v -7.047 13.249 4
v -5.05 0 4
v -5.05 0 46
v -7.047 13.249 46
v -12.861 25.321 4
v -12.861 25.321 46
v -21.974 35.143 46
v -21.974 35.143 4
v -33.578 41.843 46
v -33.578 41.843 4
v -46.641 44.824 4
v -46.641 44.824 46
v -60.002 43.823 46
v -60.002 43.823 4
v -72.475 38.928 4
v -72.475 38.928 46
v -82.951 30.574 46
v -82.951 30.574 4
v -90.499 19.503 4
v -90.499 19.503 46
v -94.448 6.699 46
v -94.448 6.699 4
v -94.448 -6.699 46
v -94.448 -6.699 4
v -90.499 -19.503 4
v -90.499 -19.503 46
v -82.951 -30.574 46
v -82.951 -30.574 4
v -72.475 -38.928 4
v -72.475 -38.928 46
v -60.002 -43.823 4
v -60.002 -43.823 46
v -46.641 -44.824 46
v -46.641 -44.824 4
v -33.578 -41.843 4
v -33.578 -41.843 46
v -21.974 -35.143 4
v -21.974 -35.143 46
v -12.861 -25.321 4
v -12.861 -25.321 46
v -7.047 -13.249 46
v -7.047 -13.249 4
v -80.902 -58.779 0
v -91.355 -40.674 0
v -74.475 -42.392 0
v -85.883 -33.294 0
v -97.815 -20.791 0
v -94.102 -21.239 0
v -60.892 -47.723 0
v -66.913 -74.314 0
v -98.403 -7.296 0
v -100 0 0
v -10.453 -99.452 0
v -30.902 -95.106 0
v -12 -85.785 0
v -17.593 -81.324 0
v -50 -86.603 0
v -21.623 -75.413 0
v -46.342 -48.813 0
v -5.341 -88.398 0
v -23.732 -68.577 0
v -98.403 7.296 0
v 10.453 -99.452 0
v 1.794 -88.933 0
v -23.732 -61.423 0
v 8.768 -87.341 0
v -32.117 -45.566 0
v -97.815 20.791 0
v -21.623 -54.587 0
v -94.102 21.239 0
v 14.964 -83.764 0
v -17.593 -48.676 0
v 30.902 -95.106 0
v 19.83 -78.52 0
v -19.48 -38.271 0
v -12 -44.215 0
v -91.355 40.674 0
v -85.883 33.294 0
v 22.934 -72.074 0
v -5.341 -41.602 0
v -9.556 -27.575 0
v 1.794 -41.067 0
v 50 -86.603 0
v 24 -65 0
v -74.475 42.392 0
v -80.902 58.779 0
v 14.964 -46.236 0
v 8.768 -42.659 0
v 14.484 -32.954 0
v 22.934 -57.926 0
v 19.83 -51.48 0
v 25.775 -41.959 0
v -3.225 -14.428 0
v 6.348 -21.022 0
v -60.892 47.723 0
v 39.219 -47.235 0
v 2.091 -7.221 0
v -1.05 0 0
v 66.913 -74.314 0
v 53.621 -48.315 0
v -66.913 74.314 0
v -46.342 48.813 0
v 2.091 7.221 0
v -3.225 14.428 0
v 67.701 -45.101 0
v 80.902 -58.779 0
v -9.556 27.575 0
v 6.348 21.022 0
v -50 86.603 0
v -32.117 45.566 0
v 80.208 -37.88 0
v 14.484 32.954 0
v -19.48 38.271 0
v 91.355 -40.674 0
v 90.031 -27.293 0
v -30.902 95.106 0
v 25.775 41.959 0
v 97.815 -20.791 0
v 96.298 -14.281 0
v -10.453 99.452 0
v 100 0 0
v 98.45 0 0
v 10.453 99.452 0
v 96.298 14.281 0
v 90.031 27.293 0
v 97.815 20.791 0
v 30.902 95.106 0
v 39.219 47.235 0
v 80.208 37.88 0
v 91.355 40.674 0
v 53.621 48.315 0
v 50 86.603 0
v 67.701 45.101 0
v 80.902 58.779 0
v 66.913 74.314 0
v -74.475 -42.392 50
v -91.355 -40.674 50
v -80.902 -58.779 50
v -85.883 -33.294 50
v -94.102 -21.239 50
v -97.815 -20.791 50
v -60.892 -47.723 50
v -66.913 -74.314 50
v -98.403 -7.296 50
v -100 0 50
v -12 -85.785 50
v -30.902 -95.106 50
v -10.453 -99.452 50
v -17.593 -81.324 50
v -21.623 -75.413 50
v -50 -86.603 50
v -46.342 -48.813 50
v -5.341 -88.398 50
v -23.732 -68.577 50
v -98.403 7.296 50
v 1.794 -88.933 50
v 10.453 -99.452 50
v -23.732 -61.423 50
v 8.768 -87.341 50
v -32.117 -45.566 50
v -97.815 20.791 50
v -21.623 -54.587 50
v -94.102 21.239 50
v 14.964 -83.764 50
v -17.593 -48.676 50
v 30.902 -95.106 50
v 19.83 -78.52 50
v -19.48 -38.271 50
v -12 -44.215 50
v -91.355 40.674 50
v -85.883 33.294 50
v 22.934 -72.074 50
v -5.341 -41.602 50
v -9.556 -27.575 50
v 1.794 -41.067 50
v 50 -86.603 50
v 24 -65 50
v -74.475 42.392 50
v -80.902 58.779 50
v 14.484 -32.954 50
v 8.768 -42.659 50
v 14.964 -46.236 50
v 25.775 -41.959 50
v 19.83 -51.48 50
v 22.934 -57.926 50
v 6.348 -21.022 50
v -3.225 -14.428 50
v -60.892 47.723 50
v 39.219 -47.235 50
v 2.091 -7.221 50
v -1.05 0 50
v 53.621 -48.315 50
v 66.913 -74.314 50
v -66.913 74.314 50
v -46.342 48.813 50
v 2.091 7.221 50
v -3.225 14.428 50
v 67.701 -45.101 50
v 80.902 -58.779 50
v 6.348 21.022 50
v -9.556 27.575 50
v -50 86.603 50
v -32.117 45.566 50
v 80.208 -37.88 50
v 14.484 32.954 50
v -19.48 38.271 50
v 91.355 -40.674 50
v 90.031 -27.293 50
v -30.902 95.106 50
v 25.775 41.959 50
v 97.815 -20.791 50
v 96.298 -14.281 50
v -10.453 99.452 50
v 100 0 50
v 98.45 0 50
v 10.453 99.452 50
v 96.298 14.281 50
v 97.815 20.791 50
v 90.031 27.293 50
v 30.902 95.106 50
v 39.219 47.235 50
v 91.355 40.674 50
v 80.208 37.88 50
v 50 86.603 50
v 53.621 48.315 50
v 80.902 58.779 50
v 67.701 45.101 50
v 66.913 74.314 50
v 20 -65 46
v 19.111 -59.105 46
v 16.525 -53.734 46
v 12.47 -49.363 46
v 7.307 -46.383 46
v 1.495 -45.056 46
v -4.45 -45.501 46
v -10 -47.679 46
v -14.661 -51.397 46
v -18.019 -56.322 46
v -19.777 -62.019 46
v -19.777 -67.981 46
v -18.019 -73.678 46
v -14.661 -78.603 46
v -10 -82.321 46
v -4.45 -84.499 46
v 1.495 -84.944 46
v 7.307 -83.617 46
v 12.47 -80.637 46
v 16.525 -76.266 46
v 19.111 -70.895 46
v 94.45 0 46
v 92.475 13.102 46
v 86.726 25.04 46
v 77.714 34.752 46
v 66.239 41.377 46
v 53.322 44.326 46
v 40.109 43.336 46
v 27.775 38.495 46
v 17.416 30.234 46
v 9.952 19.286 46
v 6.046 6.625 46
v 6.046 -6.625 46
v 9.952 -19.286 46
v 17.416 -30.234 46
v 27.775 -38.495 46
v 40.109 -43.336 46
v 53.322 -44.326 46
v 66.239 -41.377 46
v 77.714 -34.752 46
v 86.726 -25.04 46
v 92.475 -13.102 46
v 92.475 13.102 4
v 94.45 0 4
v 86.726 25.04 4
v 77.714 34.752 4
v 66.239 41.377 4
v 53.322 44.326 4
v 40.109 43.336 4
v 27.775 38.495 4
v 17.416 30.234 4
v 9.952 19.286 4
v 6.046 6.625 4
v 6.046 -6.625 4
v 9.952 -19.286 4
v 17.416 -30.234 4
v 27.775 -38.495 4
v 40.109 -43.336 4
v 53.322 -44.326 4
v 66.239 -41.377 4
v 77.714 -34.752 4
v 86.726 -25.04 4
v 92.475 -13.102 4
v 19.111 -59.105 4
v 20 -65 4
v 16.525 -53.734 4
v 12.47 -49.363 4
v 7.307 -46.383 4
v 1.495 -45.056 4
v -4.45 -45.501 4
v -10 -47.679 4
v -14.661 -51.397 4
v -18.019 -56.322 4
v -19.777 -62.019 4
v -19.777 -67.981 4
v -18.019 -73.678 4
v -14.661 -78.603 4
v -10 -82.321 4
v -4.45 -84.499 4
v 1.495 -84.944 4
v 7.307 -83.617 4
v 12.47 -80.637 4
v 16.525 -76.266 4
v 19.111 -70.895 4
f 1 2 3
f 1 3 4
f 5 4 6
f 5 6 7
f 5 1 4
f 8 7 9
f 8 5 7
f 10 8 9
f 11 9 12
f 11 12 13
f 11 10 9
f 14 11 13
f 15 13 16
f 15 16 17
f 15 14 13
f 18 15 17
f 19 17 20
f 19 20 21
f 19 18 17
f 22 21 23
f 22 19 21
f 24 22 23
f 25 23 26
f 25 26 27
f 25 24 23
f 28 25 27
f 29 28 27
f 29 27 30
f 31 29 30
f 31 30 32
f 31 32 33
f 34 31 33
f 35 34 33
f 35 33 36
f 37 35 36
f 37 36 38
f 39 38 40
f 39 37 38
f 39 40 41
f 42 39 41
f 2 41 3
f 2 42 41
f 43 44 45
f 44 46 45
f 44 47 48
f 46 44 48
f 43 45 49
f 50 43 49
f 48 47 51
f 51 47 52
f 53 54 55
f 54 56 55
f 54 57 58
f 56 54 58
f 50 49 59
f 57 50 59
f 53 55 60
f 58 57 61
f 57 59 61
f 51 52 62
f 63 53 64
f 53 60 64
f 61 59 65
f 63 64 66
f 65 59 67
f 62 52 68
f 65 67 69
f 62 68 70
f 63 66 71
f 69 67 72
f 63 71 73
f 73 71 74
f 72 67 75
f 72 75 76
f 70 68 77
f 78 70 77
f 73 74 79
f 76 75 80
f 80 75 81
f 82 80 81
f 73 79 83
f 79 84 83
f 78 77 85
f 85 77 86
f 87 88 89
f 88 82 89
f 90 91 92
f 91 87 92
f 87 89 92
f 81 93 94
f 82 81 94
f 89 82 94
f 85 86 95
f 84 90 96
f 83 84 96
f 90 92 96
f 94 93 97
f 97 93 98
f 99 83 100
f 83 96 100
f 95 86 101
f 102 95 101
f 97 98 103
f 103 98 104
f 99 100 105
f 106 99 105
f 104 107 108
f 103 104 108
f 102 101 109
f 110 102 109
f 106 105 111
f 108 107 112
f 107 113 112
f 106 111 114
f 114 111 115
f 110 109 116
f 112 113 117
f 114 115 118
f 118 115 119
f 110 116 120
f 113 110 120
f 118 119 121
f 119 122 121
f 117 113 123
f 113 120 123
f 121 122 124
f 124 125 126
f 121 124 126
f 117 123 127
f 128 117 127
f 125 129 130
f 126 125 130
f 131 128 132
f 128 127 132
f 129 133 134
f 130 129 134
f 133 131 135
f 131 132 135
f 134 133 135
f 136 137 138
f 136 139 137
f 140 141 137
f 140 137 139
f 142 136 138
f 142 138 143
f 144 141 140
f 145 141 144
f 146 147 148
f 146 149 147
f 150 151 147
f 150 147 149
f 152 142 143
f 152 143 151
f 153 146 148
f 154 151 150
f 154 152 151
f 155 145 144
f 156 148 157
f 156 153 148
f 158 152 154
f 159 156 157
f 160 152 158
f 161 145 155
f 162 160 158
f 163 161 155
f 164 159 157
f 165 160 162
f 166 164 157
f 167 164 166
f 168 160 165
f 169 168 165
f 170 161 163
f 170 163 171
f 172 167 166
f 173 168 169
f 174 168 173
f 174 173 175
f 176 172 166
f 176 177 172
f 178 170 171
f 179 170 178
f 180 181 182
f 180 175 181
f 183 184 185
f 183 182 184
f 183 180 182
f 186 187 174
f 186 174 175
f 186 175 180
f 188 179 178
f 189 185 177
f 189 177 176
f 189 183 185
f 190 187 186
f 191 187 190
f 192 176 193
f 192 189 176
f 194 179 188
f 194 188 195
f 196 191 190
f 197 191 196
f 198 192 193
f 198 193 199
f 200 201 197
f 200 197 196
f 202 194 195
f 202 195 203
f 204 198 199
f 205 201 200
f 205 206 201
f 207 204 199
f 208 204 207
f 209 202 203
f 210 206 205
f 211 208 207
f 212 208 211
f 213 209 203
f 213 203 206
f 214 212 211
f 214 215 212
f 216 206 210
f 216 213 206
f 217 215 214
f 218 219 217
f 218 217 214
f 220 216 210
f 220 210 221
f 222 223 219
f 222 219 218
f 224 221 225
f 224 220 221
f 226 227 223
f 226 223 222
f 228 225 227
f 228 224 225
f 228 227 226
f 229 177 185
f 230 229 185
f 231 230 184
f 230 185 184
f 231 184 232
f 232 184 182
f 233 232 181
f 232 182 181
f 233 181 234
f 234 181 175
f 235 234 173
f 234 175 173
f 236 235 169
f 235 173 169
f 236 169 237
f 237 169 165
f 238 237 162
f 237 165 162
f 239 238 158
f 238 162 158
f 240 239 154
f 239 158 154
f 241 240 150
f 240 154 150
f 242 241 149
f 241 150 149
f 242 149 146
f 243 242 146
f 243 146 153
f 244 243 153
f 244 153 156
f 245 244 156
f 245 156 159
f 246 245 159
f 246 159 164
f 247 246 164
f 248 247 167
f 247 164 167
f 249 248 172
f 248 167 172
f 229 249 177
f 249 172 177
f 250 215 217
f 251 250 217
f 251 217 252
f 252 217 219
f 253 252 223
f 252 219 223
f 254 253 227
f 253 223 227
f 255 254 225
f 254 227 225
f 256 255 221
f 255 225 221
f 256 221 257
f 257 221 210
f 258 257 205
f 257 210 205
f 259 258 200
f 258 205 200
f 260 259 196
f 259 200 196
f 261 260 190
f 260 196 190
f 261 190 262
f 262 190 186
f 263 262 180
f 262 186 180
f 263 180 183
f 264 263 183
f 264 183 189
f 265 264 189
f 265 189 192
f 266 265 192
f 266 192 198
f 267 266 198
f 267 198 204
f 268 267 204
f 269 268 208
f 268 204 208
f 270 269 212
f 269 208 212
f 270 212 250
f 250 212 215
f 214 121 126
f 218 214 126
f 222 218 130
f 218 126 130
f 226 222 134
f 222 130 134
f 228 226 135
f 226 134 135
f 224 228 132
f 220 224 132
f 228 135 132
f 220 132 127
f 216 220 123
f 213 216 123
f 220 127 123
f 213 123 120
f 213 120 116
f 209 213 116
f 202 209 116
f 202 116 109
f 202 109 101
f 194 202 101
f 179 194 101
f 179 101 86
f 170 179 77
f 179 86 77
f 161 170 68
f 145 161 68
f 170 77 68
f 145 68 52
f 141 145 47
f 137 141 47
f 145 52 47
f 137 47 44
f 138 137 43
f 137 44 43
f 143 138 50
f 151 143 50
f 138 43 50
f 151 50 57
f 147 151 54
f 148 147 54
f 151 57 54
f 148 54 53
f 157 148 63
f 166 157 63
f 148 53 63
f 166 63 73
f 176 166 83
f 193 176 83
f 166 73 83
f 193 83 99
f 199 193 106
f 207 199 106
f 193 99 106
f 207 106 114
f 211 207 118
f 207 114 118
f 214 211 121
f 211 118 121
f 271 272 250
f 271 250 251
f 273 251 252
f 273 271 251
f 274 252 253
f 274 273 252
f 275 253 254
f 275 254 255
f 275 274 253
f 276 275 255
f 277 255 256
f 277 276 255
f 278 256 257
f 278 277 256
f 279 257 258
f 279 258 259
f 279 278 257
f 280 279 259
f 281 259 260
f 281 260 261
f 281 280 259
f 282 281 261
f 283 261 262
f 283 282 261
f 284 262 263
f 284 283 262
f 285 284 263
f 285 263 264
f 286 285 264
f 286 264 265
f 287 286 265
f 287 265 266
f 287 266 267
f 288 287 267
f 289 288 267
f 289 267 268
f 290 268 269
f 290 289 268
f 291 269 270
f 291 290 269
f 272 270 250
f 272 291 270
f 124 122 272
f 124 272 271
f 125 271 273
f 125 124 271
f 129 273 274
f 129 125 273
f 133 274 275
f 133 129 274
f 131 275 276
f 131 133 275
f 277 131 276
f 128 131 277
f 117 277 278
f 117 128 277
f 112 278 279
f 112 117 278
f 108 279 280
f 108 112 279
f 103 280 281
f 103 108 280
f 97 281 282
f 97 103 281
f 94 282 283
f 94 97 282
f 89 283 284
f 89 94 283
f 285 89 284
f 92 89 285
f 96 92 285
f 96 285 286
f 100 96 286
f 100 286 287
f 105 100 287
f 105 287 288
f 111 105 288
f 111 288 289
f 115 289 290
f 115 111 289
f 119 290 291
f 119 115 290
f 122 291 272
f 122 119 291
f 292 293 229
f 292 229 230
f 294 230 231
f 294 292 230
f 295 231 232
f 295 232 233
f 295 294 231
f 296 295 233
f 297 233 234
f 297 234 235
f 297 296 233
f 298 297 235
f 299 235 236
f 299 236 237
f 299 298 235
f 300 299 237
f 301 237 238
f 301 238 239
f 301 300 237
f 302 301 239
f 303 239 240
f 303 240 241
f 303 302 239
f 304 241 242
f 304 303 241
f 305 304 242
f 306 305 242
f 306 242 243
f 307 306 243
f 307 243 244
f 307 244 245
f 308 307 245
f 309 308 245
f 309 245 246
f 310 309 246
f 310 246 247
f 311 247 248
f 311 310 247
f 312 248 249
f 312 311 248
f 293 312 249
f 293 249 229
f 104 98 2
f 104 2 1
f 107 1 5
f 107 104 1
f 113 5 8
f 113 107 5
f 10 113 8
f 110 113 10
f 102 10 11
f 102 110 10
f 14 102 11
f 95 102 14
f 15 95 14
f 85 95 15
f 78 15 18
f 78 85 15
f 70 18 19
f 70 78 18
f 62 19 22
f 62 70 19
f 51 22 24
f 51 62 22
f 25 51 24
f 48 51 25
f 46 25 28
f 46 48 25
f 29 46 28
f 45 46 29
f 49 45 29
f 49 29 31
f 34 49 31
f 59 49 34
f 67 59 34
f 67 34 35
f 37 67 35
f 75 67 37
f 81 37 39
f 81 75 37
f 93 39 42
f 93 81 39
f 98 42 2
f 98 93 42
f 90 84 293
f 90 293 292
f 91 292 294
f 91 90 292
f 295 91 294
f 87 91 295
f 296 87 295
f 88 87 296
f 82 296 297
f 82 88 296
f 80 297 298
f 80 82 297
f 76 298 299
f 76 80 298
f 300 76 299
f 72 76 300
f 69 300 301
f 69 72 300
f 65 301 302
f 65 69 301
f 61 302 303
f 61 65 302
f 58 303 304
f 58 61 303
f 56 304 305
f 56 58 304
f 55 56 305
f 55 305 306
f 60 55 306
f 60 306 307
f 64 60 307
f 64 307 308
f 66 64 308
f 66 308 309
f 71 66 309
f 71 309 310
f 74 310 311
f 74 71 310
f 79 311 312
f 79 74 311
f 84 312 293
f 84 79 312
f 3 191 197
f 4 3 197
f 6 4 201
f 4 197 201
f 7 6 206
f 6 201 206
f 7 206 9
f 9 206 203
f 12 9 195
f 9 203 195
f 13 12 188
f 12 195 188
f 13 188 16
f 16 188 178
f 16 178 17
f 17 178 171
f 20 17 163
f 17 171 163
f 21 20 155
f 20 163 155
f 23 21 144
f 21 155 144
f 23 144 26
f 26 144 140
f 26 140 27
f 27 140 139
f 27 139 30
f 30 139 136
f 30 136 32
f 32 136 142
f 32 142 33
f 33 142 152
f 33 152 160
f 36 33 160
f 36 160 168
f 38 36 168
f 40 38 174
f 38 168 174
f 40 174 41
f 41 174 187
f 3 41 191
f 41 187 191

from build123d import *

# Parameters (mm, degrees)
F0_R     = 100
F0_R_2   = 20
F0_R_3   = 44.95
F0_R_4   = 44.45
F1_DEPTH = 50
F2_SIZE  = 4


with BuildPart() as f1:
    # F0 (on Top) → F1 (new body)
    with BuildSketch(Plane.XY):
        Circle(F0_R)
        with Locations((0, -65)):
            Circle(F0_R_2, mode=Mode.SUBTRACT)
        with Locations((-50, 0)):
            Circle(F0_R_3, mode=Mode.SUBTRACT)
        with Locations((50, 0)):
            Circle(F0_R_4, mode=Mode.SUBTRACT)
    extrude(amount=F1_DEPTH)

    # F2
    f2_edges = [f1.edges().sort_by_distance(p)[0] for p in [
        (5.55, 0, 50),
        (-94.95, 0, 50),
        (-20, -65, 50),
        (5.55, 0, 0),
        (-94.95, 0, 0),
        (-20, -65, 0),
    ]]
    chamfer(f2_edges, length=F2_SIZE)


solid = f1.part
